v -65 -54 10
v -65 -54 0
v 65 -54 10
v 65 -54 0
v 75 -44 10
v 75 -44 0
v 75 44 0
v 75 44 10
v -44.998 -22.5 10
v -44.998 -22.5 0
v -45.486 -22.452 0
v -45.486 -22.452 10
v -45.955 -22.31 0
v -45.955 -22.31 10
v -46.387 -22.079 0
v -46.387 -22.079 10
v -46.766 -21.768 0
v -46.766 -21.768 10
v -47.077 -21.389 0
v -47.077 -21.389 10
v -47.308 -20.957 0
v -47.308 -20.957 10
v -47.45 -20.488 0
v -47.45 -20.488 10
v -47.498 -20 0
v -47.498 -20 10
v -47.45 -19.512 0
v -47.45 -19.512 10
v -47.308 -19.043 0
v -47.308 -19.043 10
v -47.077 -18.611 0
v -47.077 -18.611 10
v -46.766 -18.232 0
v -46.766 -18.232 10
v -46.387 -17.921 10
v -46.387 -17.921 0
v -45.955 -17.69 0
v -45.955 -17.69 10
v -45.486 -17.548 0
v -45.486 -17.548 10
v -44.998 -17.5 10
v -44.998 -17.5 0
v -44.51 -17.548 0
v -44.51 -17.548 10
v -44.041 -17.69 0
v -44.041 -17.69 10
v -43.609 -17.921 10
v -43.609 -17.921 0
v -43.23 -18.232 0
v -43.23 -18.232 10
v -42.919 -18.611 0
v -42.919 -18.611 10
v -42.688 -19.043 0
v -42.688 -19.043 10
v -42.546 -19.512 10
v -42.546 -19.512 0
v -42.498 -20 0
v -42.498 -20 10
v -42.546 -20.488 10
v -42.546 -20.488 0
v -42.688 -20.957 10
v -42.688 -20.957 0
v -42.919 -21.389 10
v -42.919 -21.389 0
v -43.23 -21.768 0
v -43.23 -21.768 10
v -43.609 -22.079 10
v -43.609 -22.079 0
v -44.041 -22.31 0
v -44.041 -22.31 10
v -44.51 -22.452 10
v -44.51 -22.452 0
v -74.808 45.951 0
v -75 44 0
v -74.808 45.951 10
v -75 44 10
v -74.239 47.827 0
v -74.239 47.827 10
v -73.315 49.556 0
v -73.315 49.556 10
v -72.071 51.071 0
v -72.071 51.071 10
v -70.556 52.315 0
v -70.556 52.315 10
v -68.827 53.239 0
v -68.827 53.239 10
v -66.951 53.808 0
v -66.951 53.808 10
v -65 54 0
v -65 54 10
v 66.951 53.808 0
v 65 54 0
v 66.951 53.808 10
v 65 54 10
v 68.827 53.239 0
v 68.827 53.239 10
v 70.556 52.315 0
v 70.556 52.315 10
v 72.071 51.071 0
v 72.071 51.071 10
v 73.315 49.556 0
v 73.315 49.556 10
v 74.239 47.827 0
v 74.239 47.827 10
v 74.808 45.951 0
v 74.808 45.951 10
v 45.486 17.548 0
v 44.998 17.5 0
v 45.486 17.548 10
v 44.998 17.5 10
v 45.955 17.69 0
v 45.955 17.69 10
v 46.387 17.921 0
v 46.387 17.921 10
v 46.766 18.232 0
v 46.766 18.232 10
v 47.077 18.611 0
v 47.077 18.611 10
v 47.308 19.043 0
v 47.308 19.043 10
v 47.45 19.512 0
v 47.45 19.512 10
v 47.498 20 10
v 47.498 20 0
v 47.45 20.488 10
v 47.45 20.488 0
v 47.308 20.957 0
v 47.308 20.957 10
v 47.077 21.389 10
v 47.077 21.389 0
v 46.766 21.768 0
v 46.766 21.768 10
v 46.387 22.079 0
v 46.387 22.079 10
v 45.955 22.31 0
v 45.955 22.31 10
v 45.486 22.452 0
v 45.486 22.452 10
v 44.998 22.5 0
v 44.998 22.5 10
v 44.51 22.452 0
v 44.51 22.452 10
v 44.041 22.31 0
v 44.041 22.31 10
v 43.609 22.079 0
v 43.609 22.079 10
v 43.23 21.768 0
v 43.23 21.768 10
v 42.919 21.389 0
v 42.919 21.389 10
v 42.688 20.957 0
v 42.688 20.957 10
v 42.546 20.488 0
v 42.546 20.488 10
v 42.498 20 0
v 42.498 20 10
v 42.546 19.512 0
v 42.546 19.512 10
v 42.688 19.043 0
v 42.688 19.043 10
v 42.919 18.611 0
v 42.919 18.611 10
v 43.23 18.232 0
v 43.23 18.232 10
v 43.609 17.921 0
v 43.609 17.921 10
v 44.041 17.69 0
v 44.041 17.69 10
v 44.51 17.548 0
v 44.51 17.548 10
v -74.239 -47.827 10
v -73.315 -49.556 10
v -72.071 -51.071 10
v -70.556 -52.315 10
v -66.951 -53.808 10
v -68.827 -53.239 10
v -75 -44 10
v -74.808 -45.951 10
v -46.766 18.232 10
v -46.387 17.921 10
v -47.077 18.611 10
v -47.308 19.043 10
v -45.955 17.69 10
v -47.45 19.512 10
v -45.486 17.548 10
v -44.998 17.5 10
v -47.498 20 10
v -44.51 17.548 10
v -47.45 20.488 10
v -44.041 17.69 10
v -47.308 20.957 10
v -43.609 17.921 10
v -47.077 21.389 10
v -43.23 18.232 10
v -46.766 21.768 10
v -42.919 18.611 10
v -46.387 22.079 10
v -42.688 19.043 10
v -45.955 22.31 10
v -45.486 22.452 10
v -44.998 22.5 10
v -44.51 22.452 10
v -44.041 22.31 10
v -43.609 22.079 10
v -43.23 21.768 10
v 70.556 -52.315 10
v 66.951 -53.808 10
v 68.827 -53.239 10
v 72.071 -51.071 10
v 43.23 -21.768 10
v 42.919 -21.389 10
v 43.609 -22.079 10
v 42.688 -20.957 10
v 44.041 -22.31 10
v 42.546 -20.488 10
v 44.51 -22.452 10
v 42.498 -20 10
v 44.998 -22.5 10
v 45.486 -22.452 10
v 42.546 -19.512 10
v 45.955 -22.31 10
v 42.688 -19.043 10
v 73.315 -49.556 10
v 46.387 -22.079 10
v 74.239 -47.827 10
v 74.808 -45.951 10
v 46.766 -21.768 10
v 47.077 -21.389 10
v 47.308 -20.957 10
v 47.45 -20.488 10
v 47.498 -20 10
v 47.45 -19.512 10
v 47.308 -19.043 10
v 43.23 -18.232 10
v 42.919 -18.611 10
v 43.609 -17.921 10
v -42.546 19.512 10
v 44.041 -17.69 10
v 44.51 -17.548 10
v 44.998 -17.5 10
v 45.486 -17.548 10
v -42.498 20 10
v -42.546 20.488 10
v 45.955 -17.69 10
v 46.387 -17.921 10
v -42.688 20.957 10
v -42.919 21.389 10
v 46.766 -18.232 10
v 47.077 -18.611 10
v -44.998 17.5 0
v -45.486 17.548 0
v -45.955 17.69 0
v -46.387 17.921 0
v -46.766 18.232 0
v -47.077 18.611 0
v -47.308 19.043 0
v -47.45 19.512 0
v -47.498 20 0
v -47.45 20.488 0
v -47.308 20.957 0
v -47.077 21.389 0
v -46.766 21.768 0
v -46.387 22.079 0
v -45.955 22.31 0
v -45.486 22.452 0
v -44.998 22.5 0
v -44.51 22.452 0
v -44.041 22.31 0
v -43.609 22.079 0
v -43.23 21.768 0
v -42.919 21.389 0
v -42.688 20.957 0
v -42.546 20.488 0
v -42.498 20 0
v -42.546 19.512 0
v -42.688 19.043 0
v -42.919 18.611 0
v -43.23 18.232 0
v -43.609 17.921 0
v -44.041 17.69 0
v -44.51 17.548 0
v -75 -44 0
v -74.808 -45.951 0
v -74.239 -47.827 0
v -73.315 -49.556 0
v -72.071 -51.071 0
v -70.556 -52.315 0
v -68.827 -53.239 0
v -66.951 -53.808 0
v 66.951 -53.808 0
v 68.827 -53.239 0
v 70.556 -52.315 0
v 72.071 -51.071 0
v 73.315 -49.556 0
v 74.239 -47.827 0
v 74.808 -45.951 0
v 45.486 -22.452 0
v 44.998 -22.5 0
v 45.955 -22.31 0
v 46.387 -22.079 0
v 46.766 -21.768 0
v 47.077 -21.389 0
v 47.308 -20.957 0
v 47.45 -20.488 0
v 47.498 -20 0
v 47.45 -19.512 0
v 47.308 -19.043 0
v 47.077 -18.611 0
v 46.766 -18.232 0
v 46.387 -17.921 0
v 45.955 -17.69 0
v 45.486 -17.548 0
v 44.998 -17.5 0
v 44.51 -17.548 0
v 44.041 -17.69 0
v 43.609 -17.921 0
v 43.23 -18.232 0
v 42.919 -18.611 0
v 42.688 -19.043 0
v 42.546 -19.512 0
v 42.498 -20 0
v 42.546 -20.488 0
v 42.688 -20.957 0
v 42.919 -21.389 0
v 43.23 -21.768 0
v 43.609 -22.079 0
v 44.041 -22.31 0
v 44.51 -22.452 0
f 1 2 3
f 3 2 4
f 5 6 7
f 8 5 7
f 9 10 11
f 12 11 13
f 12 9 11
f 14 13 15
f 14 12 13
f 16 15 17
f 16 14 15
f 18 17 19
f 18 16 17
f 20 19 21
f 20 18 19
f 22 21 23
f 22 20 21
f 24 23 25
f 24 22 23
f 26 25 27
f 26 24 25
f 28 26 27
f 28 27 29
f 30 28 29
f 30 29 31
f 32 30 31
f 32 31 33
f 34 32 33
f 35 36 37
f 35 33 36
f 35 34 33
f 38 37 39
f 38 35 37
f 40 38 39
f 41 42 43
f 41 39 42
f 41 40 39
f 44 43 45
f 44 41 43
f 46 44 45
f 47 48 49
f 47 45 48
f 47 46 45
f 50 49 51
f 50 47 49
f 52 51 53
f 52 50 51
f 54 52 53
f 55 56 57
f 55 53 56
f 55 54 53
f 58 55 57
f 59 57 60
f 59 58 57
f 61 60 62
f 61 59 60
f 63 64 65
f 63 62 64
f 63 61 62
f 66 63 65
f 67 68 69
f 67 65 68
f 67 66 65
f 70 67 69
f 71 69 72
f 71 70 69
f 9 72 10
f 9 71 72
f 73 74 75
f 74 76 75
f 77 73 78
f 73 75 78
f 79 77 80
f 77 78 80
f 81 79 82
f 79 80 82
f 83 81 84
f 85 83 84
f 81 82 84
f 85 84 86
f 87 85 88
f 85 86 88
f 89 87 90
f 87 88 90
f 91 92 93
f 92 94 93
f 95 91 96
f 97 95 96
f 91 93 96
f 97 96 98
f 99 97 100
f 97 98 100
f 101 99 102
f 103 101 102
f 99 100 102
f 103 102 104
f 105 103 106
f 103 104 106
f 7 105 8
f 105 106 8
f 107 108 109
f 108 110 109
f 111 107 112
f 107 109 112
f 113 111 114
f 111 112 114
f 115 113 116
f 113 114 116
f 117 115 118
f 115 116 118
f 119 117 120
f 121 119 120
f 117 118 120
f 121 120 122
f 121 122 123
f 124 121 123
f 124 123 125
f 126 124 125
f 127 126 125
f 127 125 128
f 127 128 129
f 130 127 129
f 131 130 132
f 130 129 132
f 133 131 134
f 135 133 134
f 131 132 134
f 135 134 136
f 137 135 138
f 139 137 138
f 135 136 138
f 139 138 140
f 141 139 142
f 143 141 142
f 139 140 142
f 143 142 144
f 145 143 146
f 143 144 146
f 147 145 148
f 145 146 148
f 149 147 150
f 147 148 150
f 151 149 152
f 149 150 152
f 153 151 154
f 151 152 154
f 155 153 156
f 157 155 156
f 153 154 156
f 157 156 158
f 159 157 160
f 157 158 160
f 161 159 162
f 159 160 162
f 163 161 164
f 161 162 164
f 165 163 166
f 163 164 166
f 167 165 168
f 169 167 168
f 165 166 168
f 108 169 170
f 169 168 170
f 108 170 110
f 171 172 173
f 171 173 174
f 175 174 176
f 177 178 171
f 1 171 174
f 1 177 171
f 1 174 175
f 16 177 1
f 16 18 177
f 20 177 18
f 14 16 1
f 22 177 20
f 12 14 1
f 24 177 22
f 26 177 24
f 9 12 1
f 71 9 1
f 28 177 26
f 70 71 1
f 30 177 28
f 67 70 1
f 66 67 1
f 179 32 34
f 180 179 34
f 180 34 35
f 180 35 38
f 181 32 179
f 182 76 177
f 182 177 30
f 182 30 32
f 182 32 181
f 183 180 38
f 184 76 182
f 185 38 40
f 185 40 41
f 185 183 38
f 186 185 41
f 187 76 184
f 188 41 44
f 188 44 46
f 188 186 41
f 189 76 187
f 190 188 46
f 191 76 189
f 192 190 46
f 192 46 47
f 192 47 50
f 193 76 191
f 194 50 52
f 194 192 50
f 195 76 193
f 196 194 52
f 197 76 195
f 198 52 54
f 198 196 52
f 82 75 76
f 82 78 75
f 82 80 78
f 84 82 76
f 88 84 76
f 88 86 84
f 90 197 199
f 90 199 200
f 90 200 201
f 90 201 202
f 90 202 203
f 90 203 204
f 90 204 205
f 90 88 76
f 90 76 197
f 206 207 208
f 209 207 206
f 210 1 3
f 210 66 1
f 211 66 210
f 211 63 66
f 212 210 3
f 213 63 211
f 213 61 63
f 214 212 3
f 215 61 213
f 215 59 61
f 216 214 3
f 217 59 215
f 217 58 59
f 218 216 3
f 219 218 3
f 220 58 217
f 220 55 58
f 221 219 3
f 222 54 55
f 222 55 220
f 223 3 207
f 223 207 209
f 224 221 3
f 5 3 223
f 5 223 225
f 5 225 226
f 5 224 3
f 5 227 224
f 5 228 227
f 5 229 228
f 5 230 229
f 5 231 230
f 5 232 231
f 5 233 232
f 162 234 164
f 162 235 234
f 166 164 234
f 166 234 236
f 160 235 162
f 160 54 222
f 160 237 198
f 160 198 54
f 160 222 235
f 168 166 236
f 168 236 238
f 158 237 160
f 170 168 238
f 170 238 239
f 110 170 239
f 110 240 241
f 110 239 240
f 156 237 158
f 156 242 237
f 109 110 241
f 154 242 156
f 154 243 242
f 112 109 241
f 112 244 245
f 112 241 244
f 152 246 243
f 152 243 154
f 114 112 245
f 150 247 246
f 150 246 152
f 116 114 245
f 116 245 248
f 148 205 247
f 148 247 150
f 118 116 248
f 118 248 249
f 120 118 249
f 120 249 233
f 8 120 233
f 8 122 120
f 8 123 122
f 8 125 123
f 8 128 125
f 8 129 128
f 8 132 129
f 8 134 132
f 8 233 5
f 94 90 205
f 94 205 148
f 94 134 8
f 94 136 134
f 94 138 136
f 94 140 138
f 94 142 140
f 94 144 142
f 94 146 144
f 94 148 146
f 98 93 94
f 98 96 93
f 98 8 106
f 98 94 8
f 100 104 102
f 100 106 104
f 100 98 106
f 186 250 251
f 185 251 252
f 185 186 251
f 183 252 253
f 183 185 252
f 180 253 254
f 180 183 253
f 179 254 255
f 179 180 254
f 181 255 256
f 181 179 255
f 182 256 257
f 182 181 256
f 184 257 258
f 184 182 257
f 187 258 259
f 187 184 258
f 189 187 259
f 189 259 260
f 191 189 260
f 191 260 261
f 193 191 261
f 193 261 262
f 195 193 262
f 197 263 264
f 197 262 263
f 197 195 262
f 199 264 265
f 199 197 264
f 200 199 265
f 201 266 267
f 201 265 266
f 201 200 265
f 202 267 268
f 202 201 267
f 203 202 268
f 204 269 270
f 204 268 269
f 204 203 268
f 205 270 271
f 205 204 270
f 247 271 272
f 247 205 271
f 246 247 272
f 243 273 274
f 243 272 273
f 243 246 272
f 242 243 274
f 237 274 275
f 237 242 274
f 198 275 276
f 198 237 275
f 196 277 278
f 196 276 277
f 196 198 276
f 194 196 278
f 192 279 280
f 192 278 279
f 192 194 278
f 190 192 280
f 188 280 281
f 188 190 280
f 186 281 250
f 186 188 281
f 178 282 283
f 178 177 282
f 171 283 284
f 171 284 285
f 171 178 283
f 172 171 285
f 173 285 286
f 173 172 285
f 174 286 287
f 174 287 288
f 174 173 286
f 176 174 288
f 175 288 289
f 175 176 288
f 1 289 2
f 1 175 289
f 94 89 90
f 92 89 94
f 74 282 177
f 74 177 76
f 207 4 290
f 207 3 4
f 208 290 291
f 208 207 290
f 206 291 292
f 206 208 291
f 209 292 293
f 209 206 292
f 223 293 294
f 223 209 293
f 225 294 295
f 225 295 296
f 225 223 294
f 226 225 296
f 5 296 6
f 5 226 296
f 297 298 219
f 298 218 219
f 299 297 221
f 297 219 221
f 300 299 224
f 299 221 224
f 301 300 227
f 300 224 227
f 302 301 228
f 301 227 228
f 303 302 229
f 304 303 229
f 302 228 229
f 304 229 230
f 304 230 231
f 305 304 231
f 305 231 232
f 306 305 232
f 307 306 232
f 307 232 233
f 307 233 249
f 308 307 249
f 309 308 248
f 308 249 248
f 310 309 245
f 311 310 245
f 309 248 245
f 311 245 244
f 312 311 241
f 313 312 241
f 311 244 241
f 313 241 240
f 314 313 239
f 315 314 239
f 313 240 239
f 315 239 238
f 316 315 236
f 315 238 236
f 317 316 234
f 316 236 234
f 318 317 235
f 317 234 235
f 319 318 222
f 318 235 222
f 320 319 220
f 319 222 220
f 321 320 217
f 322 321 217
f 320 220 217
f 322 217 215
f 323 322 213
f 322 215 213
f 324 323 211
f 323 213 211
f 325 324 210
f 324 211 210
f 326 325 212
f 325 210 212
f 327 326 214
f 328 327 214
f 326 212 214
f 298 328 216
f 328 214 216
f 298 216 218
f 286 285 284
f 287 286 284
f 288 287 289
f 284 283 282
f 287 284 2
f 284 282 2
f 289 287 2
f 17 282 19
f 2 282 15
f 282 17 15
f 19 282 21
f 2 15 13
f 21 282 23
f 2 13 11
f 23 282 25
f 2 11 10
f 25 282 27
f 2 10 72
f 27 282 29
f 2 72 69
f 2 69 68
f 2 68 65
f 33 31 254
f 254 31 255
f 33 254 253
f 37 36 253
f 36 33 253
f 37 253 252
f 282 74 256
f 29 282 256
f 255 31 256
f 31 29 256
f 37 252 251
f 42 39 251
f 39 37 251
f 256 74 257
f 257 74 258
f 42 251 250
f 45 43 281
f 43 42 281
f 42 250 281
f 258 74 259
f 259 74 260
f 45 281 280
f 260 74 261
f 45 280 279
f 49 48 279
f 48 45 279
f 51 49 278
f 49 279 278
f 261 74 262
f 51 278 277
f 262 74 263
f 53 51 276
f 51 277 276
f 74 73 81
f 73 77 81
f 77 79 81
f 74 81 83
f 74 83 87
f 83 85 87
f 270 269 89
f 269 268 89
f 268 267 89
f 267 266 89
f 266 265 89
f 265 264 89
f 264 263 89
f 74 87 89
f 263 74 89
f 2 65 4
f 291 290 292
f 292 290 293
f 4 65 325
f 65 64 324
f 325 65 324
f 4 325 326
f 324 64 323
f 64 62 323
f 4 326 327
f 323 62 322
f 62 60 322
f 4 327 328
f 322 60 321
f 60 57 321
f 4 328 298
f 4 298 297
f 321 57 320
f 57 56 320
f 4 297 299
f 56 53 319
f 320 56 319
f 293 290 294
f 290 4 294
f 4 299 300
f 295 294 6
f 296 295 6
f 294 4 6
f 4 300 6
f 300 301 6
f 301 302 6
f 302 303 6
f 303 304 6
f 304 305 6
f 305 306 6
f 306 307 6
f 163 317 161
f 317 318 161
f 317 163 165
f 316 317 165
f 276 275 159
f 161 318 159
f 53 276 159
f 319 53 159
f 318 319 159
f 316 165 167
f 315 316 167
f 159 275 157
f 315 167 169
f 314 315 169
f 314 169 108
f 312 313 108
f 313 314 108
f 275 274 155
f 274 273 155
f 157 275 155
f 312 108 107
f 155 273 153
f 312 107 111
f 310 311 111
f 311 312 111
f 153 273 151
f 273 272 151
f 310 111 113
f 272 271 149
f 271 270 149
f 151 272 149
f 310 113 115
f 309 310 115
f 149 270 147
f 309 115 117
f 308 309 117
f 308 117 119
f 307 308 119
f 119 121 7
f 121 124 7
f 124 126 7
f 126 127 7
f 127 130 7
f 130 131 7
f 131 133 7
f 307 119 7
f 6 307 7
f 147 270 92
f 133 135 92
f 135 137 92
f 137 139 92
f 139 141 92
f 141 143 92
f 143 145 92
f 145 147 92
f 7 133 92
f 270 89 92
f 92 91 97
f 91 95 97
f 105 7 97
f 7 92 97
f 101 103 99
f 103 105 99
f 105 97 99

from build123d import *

# Parameters (mm, degrees)
SKETCH1_W                  = 150
SKETCH1_H                  = 108
BOSS_EXTRUDE1_DEPTH        = 10
M6_TAPPED_HOLE1_AT_2_COUNT = 2
M6_TAPPED_HOLE1_AT_2_PITCH = 40
FILLET1_R                  = 10


with BuildPart() as part:
    # Sketch1 → Boss-Extrude1 (new body)
    with BuildSketch(Plane.XY):
        Rectangle(SKETCH1_W, SKETCH1_H)
    extrude(amount=BOSS_EXTRUDE1_DEPTH)

    # Sketch4 → M6 Tapped Hole1 (revolve, cut)
    with BuildSketch(Plane(origin=(-44.997893633, 20, 10), x_dir=(0, -1, 0), z_dir=(1, 0, 0))):
        Polygon((0, 0), (0, 16.502151548), (2.5, 15), (2.5, 0), align=None)
    m6_tapped_hole1 = revolve(axis=Axis((-44.997893633, 20, 16.35), (0, 0, -1)), mode=Mode.SUBTRACT)

    # M6 Tapped Hole1 at 2: M6 Tapped Hole1 ×2
    with Locations(*[(0, -i * M6_TAPPED_HOLE1_AT_2_PITCH, 0) for i in range(1, M6_TAPPED_HOLE1_AT_2_COUNT)]):
        add(m6_tapped_hole1, mode=Mode.SUBTRACT)

    # Mirror1: M6 Tapped Hole1 across plane
    add(m6_tapped_hole1.mirror(Plane(origin=(0, 0, 0), x_dir=(0, 0, 1), z_dir=(1, 0, 0))), mode=Mode.SUBTRACT)

    # Mirror1 copy 1 sketch → Mirror1 copy 1 (revolve, cut)
    with BuildSketch(Plane(origin=(44.997893633, -20, 10), x_dir=(0, -1, 0), z_dir=(-1, 0, 0))):
        Polygon((0, 0), (0, -16.502151548), (2.5, -15), (2.5, 0), align=None)
    revolve(axis=Axis((44.997893633, -20, 16.35), (0, 0, 1)), mode=Mode.SUBTRACT)

    # Fillet1
    fillet1_edges = [part.edges().sort_by_distance(p)[0] for p in [
        (75, -54, 5),
        (-75, -54, 5),
        (-75, 54, 5),
        (75, 54, 5),
    ]]
    fillet(fillet1_edges, radius=FILLET1_R)


solid = part.part
